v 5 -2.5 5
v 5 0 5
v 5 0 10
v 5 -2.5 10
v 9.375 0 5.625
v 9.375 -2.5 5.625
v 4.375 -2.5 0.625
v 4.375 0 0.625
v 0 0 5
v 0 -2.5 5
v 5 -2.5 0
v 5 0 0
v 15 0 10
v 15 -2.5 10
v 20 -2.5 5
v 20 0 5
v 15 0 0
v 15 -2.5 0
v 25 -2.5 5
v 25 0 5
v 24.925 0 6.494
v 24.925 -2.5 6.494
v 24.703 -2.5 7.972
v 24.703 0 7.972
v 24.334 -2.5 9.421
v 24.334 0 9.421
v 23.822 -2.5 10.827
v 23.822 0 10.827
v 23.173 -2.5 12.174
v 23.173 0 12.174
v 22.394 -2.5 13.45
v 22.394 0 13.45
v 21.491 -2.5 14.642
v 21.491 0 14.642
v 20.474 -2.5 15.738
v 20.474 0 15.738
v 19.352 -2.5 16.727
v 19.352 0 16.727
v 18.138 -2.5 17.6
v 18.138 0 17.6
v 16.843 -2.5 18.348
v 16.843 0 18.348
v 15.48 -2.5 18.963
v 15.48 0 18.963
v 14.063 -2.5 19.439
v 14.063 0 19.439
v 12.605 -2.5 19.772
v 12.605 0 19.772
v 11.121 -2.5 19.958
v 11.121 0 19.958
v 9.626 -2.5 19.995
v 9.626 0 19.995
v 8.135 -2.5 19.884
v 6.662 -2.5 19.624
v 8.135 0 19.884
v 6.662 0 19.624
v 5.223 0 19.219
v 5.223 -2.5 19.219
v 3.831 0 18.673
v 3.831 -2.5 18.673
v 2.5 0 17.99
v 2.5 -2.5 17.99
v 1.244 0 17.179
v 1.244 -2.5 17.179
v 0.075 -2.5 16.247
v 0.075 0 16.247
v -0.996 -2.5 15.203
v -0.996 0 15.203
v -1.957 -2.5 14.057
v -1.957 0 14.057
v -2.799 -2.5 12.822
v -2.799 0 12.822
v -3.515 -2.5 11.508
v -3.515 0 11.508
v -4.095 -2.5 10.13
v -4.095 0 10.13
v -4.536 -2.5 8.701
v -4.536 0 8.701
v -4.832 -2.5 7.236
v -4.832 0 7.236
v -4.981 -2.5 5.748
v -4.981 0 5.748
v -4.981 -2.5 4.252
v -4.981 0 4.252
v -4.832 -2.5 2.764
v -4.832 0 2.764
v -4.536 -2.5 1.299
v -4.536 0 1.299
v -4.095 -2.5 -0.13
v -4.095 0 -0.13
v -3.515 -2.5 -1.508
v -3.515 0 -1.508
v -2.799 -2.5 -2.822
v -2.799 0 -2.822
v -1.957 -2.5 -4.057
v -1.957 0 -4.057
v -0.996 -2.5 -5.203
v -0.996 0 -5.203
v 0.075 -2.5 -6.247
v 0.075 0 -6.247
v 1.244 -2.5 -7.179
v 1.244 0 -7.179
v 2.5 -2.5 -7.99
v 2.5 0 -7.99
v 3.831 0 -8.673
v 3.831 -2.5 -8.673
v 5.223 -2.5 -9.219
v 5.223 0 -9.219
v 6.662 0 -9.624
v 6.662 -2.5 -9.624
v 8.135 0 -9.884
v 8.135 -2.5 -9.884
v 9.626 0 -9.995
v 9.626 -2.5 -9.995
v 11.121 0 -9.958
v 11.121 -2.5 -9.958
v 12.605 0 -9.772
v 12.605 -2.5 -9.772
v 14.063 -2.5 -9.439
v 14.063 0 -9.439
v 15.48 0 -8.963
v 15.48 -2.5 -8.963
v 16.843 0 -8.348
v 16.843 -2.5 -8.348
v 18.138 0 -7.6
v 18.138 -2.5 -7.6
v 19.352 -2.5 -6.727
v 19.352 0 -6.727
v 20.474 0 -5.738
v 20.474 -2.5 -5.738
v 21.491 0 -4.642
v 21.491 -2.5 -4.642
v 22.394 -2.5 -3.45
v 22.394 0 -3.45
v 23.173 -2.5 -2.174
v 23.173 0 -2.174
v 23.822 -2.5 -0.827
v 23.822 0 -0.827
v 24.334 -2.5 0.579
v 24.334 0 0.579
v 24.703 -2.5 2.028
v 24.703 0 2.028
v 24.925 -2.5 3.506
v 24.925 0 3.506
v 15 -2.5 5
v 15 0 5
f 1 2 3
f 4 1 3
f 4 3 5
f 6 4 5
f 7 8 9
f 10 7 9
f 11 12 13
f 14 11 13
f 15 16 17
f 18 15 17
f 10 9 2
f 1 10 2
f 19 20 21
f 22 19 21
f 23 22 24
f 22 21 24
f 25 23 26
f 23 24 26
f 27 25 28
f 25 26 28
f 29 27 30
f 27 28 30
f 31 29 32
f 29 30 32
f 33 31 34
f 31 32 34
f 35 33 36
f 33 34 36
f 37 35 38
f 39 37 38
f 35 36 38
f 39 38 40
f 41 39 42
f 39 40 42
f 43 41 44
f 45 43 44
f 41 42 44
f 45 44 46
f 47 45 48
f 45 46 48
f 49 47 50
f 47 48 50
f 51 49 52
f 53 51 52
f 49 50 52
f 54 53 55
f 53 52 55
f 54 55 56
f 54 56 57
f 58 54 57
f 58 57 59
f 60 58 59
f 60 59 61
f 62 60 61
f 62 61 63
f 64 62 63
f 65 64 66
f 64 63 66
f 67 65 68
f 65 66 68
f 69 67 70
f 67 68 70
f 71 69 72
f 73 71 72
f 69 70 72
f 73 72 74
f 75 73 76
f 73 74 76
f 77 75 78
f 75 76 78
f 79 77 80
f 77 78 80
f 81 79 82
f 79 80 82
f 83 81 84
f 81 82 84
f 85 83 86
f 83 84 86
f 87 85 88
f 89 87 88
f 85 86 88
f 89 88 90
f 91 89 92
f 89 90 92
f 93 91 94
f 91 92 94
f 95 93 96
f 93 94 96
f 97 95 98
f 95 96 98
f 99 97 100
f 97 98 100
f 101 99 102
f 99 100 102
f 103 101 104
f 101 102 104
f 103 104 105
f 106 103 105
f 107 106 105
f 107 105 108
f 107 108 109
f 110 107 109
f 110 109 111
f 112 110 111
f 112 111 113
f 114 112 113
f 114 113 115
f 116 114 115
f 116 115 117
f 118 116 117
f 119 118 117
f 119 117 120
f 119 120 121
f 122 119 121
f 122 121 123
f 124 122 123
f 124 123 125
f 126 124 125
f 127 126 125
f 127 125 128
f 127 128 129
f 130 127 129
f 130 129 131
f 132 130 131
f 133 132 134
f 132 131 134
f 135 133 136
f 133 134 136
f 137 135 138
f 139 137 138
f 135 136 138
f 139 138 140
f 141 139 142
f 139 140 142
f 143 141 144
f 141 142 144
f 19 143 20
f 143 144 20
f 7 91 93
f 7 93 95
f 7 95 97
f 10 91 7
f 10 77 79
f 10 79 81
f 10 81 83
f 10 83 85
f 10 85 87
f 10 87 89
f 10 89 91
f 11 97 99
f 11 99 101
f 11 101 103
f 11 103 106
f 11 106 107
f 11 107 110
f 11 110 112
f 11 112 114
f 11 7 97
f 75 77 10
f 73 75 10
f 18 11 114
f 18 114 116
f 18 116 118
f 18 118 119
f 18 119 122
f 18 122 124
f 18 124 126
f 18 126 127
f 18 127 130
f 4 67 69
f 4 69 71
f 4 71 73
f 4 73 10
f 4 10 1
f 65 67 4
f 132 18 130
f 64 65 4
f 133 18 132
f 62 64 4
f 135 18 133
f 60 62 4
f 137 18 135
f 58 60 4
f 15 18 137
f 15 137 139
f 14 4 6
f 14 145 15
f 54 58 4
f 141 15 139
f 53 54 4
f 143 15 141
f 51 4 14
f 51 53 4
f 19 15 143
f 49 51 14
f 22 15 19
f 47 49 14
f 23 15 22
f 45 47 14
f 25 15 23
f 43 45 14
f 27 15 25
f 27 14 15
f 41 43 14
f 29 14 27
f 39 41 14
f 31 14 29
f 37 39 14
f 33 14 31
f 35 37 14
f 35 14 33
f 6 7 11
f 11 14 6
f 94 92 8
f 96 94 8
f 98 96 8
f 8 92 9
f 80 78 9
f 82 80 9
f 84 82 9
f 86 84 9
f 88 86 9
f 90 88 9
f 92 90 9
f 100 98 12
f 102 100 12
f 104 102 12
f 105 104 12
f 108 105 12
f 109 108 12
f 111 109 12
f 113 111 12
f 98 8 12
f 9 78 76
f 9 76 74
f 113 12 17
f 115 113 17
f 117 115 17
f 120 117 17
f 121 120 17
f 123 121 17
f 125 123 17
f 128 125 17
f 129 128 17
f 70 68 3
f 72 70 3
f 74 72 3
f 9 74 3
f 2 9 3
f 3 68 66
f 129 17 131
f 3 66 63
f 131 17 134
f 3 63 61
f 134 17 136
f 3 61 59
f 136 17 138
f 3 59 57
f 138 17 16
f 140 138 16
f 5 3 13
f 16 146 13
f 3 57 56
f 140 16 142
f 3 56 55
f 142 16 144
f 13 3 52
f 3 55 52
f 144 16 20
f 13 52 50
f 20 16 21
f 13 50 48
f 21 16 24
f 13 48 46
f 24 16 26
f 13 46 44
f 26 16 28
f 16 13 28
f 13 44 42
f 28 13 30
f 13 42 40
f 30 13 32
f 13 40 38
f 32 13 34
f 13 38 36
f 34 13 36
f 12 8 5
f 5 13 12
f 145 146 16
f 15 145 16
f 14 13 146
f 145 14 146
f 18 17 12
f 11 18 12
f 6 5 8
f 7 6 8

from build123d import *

# Parameters (mm, degrees)
F1_R     = 15
F2_DEPTH = 2.5


with BuildPart() as f2:
    # F1 (on Front) → F2 (new body)
    with BuildSketch(Plane.XZ):
        with Locations((10, 5)):
            Circle(F1_R)
        Polygon((4.375, 0.625), (0, 5), (5, 5), (5, 10), (9.375, 5.625), align=None, mode=Mode.SUBTRACT)
        Polygon((15, 0), (5, 0), (15, 10), (15, 5), (20, 5), align=None, mode=Mode.SUBTRACT)
    extrude(amount=F2_DEPTH)


solid = f2.part
